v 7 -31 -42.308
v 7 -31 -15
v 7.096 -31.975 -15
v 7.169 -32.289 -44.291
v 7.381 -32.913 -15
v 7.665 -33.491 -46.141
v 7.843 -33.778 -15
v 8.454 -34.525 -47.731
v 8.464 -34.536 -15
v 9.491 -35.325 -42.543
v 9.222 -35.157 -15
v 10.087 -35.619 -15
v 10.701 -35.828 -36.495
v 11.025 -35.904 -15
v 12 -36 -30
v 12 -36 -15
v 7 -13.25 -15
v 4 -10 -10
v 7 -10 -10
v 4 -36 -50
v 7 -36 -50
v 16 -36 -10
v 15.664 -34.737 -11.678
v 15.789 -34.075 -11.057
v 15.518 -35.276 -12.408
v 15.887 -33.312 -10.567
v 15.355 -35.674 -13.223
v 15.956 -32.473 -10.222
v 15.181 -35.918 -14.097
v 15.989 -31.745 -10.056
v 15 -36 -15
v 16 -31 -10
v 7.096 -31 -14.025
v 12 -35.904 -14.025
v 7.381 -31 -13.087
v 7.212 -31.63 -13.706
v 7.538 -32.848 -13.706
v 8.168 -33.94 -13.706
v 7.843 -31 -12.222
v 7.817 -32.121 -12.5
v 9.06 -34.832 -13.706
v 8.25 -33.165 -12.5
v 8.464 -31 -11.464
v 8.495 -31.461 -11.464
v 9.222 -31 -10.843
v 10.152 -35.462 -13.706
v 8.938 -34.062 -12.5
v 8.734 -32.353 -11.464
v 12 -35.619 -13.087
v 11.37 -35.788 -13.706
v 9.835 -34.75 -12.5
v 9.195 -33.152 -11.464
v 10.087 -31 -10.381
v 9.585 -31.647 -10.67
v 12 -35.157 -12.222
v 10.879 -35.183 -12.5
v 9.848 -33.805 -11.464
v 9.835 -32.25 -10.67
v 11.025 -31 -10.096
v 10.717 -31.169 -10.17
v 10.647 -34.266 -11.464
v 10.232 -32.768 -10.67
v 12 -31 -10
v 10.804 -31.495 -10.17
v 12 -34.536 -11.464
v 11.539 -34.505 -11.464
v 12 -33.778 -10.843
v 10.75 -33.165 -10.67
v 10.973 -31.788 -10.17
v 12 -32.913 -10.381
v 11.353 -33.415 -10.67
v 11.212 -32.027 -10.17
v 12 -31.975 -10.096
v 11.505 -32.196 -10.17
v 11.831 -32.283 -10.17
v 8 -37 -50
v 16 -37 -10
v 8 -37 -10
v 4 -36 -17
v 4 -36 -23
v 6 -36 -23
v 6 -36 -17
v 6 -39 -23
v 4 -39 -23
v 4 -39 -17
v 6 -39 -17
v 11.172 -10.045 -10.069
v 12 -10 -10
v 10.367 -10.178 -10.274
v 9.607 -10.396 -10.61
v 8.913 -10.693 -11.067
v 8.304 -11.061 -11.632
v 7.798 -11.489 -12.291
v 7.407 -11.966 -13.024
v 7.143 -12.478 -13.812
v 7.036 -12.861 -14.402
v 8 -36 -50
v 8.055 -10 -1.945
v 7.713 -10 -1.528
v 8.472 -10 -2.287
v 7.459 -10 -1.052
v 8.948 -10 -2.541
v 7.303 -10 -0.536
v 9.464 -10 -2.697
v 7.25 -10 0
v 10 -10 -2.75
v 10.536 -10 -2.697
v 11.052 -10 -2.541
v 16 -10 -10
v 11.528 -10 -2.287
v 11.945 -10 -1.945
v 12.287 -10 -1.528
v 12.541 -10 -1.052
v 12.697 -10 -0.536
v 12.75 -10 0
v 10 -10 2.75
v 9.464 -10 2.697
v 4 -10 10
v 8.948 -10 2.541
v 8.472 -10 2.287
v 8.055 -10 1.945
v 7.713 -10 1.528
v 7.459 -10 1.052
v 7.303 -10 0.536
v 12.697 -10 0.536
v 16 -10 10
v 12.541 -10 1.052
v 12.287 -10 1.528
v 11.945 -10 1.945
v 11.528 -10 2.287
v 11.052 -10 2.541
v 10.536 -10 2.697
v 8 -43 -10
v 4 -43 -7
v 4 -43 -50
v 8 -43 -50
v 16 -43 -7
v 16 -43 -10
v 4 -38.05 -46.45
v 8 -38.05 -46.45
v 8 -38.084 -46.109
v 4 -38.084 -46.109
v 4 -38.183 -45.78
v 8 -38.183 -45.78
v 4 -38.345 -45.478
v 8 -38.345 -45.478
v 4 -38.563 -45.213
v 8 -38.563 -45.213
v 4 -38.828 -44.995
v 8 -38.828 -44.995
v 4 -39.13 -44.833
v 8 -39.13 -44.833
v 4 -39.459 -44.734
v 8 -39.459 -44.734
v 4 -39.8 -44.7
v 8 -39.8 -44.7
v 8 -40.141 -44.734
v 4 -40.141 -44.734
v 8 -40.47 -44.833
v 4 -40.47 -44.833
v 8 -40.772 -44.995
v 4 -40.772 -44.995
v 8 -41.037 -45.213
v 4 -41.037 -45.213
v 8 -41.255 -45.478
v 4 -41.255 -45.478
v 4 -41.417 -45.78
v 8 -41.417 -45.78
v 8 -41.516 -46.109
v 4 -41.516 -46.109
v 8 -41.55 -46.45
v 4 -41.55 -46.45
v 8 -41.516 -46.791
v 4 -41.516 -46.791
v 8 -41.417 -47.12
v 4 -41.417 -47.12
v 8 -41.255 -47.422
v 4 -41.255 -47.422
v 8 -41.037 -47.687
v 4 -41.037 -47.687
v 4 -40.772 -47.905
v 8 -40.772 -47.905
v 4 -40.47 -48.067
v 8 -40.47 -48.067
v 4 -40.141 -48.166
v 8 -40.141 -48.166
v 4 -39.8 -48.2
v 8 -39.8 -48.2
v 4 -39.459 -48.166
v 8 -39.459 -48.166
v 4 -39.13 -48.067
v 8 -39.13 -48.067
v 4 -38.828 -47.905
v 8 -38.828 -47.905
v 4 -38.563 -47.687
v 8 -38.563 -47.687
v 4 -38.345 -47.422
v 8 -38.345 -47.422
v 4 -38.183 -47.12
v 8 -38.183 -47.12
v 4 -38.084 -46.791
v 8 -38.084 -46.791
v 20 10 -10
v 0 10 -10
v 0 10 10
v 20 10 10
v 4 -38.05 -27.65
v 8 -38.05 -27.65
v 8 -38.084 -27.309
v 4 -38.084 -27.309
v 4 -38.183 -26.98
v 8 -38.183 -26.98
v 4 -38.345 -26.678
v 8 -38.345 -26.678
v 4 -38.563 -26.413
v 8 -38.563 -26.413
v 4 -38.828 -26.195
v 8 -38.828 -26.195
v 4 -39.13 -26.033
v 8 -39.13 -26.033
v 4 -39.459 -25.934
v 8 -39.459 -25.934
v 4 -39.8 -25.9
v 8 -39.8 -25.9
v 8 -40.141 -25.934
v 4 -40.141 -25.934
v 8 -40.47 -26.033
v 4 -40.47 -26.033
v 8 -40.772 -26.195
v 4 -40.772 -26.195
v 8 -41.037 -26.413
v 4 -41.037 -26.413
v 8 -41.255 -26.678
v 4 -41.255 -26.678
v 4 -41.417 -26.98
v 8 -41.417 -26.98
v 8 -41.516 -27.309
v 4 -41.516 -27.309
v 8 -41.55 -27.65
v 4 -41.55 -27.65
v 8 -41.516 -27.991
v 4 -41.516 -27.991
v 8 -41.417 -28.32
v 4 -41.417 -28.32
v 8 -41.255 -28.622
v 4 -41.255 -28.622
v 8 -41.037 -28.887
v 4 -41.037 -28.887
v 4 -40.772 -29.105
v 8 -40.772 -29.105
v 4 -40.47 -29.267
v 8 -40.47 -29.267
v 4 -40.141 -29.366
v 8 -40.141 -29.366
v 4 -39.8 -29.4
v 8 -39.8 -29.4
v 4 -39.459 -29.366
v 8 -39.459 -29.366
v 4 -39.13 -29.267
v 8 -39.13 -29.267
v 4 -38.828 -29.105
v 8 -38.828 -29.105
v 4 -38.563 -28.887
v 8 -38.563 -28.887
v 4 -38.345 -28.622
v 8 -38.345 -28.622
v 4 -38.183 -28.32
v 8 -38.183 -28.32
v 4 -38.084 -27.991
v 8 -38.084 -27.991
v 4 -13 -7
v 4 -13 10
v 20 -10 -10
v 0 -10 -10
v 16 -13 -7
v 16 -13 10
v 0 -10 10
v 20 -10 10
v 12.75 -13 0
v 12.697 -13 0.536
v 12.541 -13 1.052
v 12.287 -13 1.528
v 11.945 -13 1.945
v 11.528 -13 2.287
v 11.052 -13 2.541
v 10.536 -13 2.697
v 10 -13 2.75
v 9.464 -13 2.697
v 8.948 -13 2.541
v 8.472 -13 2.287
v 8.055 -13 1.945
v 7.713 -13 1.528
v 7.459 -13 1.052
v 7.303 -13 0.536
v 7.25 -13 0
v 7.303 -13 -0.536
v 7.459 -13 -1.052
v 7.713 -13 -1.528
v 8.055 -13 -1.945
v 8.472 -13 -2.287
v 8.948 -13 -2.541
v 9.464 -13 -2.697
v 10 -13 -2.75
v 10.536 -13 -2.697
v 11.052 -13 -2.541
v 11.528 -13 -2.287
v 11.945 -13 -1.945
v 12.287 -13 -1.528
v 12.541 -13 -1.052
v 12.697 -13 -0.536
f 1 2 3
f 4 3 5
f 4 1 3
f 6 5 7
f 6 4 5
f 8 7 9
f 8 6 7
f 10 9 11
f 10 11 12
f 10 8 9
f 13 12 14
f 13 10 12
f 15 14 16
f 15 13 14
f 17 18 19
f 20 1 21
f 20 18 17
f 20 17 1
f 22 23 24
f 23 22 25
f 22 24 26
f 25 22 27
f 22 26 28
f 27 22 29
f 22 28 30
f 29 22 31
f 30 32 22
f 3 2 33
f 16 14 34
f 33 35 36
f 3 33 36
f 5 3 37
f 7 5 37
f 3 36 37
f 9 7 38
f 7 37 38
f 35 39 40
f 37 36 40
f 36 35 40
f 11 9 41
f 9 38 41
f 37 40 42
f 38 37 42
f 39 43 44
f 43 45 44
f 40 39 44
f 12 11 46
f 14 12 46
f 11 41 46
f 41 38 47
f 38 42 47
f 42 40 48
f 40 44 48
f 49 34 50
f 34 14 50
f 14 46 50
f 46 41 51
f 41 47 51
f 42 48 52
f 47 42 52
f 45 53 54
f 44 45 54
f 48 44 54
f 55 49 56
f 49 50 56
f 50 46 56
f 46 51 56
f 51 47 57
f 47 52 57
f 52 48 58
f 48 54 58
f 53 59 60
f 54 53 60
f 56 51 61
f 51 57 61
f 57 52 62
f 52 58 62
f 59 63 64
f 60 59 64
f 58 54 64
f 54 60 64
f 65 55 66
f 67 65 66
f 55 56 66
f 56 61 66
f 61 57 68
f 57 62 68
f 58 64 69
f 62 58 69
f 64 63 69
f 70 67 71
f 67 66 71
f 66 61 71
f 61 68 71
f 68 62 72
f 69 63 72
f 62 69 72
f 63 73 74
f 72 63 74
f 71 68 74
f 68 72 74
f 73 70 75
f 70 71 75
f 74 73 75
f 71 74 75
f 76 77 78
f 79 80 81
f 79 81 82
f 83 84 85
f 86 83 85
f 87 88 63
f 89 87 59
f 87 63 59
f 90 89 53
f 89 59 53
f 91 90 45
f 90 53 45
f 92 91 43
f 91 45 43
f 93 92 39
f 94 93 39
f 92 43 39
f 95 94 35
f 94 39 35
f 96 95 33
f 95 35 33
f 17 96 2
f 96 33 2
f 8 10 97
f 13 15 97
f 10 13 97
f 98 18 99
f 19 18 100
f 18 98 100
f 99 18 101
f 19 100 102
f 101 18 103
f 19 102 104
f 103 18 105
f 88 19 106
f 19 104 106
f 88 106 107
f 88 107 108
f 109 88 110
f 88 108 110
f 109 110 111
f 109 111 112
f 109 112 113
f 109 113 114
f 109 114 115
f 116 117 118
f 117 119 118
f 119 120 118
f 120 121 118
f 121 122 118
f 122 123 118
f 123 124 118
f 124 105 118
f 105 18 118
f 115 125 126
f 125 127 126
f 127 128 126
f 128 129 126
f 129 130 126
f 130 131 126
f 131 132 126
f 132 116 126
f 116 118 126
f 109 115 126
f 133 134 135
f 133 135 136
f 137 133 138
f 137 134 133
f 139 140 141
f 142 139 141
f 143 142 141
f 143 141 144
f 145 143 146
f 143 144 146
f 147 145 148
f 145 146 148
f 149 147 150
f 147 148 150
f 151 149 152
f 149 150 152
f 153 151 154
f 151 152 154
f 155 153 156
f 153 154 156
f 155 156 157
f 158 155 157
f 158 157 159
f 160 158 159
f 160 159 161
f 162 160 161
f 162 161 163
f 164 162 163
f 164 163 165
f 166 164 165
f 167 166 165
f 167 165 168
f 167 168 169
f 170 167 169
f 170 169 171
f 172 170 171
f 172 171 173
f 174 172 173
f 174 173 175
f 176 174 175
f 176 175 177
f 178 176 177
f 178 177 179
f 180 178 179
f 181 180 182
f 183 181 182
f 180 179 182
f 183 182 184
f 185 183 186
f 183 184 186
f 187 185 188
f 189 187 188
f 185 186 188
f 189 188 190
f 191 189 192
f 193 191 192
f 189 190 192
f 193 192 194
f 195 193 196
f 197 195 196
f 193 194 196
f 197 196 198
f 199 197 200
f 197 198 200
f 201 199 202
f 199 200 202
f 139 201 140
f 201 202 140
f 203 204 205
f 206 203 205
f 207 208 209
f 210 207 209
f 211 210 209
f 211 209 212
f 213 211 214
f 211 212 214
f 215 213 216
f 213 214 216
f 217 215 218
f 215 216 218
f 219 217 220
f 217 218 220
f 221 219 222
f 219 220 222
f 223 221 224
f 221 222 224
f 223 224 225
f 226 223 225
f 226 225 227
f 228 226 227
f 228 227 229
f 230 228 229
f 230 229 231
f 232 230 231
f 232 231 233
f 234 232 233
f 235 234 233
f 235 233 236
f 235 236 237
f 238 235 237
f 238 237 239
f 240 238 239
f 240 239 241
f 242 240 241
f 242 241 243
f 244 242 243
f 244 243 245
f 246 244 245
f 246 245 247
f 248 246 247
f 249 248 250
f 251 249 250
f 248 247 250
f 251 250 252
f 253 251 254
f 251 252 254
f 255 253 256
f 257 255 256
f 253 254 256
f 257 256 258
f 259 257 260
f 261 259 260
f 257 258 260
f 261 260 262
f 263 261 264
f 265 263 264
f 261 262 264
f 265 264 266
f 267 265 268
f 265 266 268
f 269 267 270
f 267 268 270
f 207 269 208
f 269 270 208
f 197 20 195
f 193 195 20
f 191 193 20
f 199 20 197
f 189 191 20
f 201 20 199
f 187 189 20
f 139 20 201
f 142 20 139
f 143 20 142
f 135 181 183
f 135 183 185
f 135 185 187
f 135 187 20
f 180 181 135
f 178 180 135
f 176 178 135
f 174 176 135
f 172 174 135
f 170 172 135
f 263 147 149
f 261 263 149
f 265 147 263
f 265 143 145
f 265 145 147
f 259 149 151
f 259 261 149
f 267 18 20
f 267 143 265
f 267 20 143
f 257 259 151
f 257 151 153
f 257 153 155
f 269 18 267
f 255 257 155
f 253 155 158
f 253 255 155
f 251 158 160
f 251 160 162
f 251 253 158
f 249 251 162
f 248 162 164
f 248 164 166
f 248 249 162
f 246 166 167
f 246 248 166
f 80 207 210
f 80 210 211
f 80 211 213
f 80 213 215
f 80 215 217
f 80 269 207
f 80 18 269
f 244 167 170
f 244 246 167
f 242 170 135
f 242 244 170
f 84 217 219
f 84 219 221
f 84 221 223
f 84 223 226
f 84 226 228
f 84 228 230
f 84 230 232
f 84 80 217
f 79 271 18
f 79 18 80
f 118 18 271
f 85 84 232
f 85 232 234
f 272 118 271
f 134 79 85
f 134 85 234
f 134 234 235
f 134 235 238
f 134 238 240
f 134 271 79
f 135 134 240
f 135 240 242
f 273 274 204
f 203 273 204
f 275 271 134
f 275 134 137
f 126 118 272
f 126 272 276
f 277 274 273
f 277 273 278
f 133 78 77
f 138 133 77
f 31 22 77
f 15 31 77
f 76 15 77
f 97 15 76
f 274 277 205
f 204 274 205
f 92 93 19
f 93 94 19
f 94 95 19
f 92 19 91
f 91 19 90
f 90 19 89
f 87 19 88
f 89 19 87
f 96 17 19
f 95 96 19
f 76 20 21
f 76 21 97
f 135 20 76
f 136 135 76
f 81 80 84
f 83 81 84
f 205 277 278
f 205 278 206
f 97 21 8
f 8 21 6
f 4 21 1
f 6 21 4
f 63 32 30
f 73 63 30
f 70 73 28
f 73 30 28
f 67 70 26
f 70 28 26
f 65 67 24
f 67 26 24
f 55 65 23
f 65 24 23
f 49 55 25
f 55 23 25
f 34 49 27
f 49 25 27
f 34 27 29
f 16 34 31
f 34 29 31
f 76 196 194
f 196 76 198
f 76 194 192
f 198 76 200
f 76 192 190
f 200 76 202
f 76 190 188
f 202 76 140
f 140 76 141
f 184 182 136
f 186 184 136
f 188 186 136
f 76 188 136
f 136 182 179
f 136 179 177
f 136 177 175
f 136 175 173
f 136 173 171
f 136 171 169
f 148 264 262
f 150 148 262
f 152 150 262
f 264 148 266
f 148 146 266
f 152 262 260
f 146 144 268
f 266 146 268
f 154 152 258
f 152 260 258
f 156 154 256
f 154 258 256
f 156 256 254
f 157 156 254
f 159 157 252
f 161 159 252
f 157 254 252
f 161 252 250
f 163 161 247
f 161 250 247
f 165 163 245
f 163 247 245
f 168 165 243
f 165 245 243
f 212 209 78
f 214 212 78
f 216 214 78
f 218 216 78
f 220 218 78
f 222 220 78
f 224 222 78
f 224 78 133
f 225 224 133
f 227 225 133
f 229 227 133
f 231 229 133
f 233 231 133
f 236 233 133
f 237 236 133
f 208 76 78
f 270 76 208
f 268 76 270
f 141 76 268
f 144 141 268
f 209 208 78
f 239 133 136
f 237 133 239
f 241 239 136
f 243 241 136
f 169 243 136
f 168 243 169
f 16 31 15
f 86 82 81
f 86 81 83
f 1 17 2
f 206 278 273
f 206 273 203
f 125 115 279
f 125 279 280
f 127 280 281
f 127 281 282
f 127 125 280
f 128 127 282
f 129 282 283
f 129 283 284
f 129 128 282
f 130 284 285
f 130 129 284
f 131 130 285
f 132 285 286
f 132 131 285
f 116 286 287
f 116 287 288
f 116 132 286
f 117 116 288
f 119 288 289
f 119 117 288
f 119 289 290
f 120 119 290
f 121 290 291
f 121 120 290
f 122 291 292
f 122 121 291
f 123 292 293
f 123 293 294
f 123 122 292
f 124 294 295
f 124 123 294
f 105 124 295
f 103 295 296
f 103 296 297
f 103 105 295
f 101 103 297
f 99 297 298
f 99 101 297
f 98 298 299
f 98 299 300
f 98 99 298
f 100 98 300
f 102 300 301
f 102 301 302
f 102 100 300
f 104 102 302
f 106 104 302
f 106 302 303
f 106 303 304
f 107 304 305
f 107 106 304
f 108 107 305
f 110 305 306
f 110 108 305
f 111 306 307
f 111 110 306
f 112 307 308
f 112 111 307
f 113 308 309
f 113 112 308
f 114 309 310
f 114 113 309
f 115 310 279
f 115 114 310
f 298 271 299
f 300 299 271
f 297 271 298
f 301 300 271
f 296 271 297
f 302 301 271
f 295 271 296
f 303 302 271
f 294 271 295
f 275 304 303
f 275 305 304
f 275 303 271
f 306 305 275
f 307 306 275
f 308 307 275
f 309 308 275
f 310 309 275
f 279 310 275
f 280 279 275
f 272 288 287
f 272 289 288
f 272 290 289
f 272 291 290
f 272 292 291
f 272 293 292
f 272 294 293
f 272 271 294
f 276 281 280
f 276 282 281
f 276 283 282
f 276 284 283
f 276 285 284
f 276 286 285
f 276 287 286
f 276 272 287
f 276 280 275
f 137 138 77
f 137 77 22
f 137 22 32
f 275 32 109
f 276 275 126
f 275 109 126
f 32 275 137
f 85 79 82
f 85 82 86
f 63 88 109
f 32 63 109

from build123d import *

# Parameters (mm, degrees)
F0_W          = 20
F0_H          = 20
F1_DEPTH      = 20
F2_W          = 12
F2_H          = 20
F2_R          = 2.75
F3_DEPTH      = 3
F4_W          = 12
F4_H          = 3
F5_DEPTH      = 30
F6_W          = 4
F6_H          = 7
F7_DEPTH      = 40
F8_R          = 1.75
F9_DEPTH      = 25
F11_DEPTH     = 1
F12_W         = 3
F12_H         = 6
F13_DEPTH     = 2
F15_DEPTH     = 3
F16_S3_W      = 5
F16_S3_H      = 5
F16_T4_DEPTH  = 5
F16_T10_DEPTH = 21
F16_T15_DEPTH = 4
F16_T20_DEPTH = 35


# Not quite as in the source:
# - a fillet or chamfer that OpenCascade refuses, or shapes differently, is made with other operations: its cross-section is extruded or revolved along the edge and cut away or added


with BuildPart() as f1:
    # F0 (on Right) → F1 (new body)
    with BuildSketch(Plane.YZ):
        Rectangle(F0_W, F0_H)
    extrude(amount=F1_DEPTH)


with BuildPart() as f3:
    # F2 (on face) → F3 (new body)
    with BuildSketch(Plane.XZ.offset(10)):
        with Locations((10, 0)):
            Rectangle(F2_W, F2_H)
        with Locations((10, 0)):
            Circle(F2_R, mode=Mode.SUBTRACT)
    extrude(amount=F3_DEPTH)

    # F4 (on face) → F5 (join)
    with BuildSketch(Plane.XZ.offset(13)):
        with Locations((10, -8.5)):
            Rectangle(F4_W, F4_H)
    extrude(amount=F5_DEPTH)

    # F6 (on face) → F7 (join)
    with BuildSketch(Plane(origin=(0, 0, -10), x_dir=(1, 0, 0), z_dir=(0, 0, -1))):
        with Locations((6, 39.5)):
            Rectangle(F6_W, F6_H)
    extrude(amount=F7_DEPTH)

    # F8 (on face) → F9 (cut)
    with BuildSketch(Plane.YZ.offset(8)):
        with Locations((-39.8, -46.45)):
            Circle(F8_R)
        with Locations((-39.8, -27.65)):
            Circle(F8_R)
    extrude(amount=-F9_DEPTH, mode=Mode.SUBTRACT)

    # F10 (on face) → F11 (join)
    with BuildSketch(Plane(origin=(0, -36, 0), x_dir=(-1, 0, 0), z_dir=(0, 1, 0))):
        Polygon((-16, -10), (-8, -50), (-8, -10), align=None)
    extrude(amount=-F11_DEPTH)

    # F12 (on face) → F13 (cut)
    with BuildSketch(Plane(origin=(4, 0, 0), x_dir=(0, -1, 0), z_dir=(-1, 0, 0))):
        with Locations((37.5, -20)):
            Rectangle(F12_W, F12_H)
    extrude(amount=-F13_DEPTH, mode=Mode.SUBTRACT)

    # F14 (on face) → F15 (join)
    with BuildSketch(Plane(origin=(4, 0, 0), x_dir=(0, -1, 0), z_dir=(-1, 0, 0))):
        Polygon((36, -17), (36, -10), (10, -10), (36, -50), (36, -23), align=None)
    extrude(amount=-F15_DEPTH)

    # F16: fillet of radius 5 on 3 edges, made by hand


with BuildPart() as f16_tool2:
    # F16_s3 → F16_t4 (new body)
    with BuildSketch(Plane.XY.offset(-15)):
        with Locations((9.5, -33.5)):
            Rectangle(F16_S3_W, F16_S3_H)
    extrude(amount=F16_T4_DEPTH)

    # F16_s5 → F16_t6 (revolve, cut)
    with BuildSketch(Plane(origin=(12, -31, -15), x_dir=(0.7071067812, 0.7071067812, 0), z_dir=(0.7071067812, -0.7071067812, 0))):
        with BuildLine():
            ThreePointArc((0, -5), (5, 0), (0, 5))
            Line((0, 5), (0, -5))
        make_face()
    revolve(axis=Axis((12, -31, -15), (0, 0, 1)), mode=Mode.SUBTRACT)


with BuildPart() as f3_1:
    add(f3.part)

    # F16_t1: union F16_tool2
    add(f16_tool2.part)


with BuildPart() as f16_tool8:
    # F16_s9 → F16_t10 (new body)
    with BuildSketch(Plane.XZ.offset(31)):
        with BuildLine():
            ThreePointArc((12, -10), (8.4644660941, -11.4644660941), (7, -15))
            Line((7, -15), (7, -10))
            Line((7, -10), (12, -10))
        make_face()
    extrude(amount=-F16_T10_DEPTH)

    split(bisect_by=Plane(origin=(0, -2.460456942, 1.5992970123), x_dir=(1, 0, 0), z_dir=(0, -0.8384436163, 0.5449883506)), keep=Keep.TOP)


with BuildPart() as f3_2:
    add(f3_1.part)

    # F16_t7: union F16_tool8
    add(f16_tool8.part)


with BuildPart() as f16_tool13:
    # F16_s14 → F16_t15 (new body)
    with BuildSketch(Plane.YZ.offset(16)):
        with BuildLine():
            ThreePointArc((-31, -10), (-34.5355339059, -11.4644660941), (-36, -15))
            Line((-36, -15), (-36, -10))
            Line((-36, -10), (-31, -10))
        make_face()
    extrude(amount=-F16_T15_DEPTH)

    split(bisect_by=Plane(origin=(17.3076923077, 0, -3.4615384615), x_dir=(0, 1, 0), z_dir=(-0.9805806757, 0, 0.1961161351)), keep=Keep.TOP)


with BuildPart() as f3_3:
    add(f3_2.part)

    # F16_t12: union F16_tool13
    add(f16_tool13.part)


with BuildPart() as f16_tool18:
    # F16_s19 → F16_t20 (new body)
    with BuildSketch(Plane.XY.offset(-50)):
        with BuildLine():
            ThreePointArc((7, -31), (8.4644660941, -34.5355339059), (12, -36))
            Line((12, -36), (7, -36))
            Line((7, -36), (7, -31))
        make_face()
    extrude(amount=F16_T20_DEPTH)

    split(bisect_by=Plane(origin=(0, -2.460456942, 1.5992970123), x_dir=(1, 0, 0), z_dir=(0, -0.8384436163, 0.5449883506)), keep=Keep.TOP)

    split(bisect_by=Plane(origin=(17.3076923077, 0, -3.4615384615), x_dir=(0, 1, 0), z_dir=(-0.9805806757, 0, 0.1961161351)), keep=Keep.TOP)


with BuildPart() as f3_4:
    add(f3_3.part)

    # F16_t17: union F16_tool18
    add(f16_tool18.part)


solid = Compound([f1.part, f3_4.part])
